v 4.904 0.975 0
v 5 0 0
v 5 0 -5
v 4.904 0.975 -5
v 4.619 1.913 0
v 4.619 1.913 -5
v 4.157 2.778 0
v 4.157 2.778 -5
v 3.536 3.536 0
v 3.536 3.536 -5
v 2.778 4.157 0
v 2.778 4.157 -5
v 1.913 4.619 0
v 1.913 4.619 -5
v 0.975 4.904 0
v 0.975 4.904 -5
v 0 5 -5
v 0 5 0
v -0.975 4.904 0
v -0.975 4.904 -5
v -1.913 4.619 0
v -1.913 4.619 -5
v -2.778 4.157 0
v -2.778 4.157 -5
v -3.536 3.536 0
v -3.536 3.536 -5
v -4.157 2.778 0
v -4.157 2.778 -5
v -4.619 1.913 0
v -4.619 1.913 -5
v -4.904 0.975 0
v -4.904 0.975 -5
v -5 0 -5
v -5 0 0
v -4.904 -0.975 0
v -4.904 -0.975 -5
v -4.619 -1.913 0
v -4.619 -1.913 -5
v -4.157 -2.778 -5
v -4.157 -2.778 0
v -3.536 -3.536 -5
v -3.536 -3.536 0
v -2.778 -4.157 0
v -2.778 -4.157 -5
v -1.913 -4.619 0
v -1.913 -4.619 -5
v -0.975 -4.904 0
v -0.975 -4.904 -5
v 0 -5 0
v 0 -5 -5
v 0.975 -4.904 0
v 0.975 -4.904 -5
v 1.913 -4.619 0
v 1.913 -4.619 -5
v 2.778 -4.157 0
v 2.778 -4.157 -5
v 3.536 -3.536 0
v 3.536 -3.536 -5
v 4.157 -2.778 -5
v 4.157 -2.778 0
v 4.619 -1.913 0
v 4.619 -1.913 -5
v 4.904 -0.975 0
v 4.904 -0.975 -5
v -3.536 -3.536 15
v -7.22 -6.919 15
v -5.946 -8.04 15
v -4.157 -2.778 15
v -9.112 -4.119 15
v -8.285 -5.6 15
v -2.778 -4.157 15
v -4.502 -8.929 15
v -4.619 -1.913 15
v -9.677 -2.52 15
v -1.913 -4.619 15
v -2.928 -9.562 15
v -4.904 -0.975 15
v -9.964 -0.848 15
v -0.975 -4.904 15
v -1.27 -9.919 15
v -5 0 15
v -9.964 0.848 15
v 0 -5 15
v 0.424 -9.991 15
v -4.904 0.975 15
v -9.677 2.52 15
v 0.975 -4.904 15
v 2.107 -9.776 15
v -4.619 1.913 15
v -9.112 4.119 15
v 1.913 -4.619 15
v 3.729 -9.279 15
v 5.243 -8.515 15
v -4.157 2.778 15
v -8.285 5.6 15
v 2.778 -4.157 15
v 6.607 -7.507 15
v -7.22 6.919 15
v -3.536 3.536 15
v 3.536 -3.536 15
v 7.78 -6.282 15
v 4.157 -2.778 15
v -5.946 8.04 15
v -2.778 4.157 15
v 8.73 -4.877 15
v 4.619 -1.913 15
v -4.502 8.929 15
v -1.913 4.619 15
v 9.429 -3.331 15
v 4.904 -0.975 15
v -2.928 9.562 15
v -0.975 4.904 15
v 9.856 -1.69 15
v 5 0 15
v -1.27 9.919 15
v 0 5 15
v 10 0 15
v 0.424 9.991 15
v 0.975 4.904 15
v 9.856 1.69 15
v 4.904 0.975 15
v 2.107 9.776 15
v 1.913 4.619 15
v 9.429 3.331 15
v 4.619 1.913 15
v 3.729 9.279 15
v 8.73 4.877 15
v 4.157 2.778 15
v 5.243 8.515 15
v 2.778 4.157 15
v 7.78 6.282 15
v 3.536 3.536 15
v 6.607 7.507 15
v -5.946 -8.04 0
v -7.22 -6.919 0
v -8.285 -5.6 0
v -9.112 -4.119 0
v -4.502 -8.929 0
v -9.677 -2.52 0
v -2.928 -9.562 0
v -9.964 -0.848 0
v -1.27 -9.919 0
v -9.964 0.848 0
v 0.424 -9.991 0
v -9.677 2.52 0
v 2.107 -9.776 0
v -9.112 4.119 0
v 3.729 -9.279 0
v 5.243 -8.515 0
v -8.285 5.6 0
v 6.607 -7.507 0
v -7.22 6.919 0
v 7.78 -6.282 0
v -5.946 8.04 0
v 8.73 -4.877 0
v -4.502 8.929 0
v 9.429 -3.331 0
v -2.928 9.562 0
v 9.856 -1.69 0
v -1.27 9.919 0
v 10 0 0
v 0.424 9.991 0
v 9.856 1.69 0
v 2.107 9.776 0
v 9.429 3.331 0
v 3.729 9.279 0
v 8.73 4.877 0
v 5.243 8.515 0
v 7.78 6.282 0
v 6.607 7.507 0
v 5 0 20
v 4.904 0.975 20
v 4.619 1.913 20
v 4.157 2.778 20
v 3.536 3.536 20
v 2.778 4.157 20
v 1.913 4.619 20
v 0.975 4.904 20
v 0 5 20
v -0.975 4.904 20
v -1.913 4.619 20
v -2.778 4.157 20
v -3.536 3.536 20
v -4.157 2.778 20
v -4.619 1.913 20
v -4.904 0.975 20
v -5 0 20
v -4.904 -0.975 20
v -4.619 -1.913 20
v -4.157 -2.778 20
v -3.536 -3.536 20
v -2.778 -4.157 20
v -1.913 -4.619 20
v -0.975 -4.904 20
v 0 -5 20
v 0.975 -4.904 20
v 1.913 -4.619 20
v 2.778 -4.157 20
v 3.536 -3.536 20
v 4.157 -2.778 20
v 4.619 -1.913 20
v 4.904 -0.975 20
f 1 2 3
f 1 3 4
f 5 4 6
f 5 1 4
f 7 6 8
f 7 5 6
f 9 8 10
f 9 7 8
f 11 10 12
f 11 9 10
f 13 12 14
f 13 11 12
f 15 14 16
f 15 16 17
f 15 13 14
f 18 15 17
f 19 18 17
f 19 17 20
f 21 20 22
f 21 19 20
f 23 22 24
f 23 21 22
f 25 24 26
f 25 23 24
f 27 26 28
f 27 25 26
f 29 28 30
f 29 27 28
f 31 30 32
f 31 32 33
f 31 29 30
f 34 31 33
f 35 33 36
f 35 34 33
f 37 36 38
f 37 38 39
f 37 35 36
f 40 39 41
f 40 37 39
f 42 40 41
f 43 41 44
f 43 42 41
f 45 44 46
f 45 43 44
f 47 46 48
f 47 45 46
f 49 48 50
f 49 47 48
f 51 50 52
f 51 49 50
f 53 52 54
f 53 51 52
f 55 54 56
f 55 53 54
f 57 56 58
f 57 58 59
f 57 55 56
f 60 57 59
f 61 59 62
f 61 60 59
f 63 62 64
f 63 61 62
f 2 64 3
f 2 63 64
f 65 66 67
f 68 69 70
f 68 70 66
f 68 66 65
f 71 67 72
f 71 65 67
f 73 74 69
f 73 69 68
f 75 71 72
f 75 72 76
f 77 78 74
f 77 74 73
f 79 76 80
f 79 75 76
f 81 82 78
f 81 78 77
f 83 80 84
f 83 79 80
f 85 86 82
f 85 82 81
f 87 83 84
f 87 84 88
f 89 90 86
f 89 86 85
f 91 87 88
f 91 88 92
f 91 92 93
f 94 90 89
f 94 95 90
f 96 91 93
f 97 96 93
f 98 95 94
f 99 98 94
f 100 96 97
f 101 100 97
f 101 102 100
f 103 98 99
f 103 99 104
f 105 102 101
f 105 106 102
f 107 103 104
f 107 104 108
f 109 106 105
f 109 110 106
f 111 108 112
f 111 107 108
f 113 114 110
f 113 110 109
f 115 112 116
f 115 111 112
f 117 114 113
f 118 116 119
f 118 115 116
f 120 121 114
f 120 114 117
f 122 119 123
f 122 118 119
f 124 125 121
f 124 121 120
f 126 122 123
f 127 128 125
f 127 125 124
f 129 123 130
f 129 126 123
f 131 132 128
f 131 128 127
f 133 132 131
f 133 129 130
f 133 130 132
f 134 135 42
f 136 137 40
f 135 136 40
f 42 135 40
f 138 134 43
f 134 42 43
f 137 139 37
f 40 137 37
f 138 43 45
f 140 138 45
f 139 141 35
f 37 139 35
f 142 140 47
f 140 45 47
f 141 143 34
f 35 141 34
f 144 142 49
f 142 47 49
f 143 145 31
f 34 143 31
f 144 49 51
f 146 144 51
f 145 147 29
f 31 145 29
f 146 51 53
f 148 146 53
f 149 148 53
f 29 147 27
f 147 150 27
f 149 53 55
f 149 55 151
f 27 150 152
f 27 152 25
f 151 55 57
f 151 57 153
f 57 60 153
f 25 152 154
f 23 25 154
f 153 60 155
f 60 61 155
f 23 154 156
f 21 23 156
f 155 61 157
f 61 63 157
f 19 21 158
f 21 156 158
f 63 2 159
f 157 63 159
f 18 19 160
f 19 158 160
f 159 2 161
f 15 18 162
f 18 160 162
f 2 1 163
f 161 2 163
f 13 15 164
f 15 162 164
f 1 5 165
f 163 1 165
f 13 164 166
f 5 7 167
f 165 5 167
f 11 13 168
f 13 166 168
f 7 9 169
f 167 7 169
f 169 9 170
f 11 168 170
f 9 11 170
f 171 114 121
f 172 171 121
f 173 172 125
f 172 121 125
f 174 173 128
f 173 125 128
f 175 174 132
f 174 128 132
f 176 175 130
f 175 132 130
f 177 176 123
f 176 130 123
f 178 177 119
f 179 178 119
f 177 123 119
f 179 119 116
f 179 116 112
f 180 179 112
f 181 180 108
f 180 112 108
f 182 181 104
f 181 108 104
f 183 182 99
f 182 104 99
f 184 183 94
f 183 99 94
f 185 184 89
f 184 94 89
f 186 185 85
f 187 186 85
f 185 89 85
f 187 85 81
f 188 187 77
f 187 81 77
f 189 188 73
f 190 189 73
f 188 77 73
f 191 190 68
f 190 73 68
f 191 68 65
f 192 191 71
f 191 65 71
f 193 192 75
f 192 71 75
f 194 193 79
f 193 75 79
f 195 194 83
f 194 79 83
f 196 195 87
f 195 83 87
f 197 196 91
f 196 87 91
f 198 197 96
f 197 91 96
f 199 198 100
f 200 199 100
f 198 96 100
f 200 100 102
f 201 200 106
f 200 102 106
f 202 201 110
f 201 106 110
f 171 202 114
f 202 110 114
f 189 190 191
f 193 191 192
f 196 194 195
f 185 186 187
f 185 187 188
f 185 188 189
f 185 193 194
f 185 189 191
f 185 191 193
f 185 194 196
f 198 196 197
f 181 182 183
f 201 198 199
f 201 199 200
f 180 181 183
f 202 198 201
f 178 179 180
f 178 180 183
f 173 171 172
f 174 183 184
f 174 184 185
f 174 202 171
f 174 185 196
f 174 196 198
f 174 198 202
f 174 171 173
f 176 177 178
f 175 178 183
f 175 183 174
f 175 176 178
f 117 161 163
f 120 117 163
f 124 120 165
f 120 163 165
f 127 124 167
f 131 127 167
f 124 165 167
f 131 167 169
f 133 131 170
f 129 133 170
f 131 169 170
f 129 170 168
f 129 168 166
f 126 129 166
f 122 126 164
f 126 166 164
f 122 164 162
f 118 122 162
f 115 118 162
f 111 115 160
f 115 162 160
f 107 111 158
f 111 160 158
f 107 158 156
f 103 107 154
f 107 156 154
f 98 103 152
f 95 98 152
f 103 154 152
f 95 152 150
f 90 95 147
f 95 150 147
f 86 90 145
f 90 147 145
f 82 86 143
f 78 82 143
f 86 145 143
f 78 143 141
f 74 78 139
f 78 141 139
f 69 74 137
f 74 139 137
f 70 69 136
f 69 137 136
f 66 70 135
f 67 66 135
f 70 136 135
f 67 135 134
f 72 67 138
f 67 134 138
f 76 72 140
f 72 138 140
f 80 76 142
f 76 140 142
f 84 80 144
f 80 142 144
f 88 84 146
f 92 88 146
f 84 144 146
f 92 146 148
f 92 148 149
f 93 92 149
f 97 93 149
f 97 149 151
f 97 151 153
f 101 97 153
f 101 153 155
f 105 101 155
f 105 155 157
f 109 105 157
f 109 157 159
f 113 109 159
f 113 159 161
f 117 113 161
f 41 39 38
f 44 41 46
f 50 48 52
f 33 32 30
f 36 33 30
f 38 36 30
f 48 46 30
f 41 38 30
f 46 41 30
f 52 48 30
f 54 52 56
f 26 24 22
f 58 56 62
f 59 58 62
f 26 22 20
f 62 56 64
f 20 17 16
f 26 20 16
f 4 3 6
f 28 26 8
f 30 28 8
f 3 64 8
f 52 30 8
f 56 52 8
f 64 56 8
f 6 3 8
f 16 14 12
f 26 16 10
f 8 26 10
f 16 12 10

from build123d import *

# Parameters (mm, degrees)
SKETCH_1_R      = 10
EXTRUDE_1_DEPTH = 15
SKETCH_2_R      = 5
EXTRUDE_2_DEPTH = 5


with BuildPart() as part:
    # 스케치1 → 보스-돌출1 (new body)
    with BuildSketch(Plane.XY):
        Circle(SKETCH_1_R)
    extrude(amount=EXTRUDE_1_DEPTH)

    # 스케치2 → 보스-돌출2 (add)
    with BuildSketch(Plane.XY.offset(15)):
        Circle(SKETCH_2_R)
    extrude_2 = extrude(amount=EXTRUDE_2_DEPTH)

    # 대칭 복사1: 보스-돌출2 across plane
    add(extrude_2.mirror(Plane(origin=(0, 0, 7.5), x_dir=(1, 0, 0), z_dir=(0, 0, -1))))


solid = part.part
